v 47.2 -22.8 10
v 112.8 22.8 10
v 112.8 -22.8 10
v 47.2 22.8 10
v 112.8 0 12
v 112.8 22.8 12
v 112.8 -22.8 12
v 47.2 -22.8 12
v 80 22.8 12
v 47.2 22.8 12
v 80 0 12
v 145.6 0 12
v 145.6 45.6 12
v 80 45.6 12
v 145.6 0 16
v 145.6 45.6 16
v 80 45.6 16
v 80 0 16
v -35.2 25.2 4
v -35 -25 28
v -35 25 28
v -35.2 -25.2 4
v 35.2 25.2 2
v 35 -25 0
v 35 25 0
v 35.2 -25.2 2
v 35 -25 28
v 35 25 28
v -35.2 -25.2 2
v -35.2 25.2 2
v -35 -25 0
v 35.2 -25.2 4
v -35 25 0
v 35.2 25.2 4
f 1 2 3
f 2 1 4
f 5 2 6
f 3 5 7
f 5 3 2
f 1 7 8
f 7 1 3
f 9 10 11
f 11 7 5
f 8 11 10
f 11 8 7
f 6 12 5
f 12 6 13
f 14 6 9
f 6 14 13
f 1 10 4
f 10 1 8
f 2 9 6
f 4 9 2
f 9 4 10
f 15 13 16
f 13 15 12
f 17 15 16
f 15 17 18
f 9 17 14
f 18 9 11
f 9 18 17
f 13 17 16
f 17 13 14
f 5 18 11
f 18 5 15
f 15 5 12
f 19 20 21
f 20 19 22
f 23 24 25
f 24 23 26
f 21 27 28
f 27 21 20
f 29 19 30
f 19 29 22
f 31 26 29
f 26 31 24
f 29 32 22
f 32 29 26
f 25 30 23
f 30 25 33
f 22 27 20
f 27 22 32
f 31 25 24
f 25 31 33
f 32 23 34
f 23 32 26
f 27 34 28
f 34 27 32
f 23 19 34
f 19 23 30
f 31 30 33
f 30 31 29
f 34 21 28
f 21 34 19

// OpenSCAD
// Two-part enclosure for small electronics board
// Print orientation: both parts flat on the bed, side by side on X

// ---- Box ----
box_x = 70;    // outer length (X)
box_y = 50;    // outer width (Y)
box_z = 30;    // outer height (Z)
wall = 2;      // wall thickness (sides and end); floor is 2 mm thick
open_top = 0.2;  // small floor overhang so the open top has no coplanar faces

// ---- Lid ----
lid_x = 65.6;  // outer length of lid (X)
lid_y = 45.6;  // outer width of lid (Y)
lip_h = 4;     // height of the lip that slides into the box opening
plate_t = 2;   // thickness of the lid plate below the lip

// ---- Layout ----
gap = 10;      // clear gap between the two parts
lid_x0 = box_x + gap;  // lid starts this far along X

$fn = 64;

module box() {
    // Open-top box: sides and end walls extend into the top face by open_top
    hull() {
        translate([-box_x/2, -box_y/2, 0])
            cube([box_x, box_y, box_z - wall]);
        translate([-box_x/2 - open_top, -box_y/2 - open_top, wall])
            cube([box_x + 2*open_top, box_y + 2*open_top, wall]);
    }
}

module lid() {
    // Plate with a rectangular lip on top, centred on the plate
    translate([lid_x0, 0, 0])
        linear_extrude(height = plate_t)
            polygon([[-lid_x/2, -lid_y/2], [lid_x/2, -lid_y/2],
                     [lid_x/2, lid_y/2], [-lid_x/2, lid_y/2]]);
    translate([lid_x0, 0, plate_t])
        cube([lid_x, lid_y, lip_h]);
}

union() {
    box();
    translate([0, 0, gap])
        lid();
}
